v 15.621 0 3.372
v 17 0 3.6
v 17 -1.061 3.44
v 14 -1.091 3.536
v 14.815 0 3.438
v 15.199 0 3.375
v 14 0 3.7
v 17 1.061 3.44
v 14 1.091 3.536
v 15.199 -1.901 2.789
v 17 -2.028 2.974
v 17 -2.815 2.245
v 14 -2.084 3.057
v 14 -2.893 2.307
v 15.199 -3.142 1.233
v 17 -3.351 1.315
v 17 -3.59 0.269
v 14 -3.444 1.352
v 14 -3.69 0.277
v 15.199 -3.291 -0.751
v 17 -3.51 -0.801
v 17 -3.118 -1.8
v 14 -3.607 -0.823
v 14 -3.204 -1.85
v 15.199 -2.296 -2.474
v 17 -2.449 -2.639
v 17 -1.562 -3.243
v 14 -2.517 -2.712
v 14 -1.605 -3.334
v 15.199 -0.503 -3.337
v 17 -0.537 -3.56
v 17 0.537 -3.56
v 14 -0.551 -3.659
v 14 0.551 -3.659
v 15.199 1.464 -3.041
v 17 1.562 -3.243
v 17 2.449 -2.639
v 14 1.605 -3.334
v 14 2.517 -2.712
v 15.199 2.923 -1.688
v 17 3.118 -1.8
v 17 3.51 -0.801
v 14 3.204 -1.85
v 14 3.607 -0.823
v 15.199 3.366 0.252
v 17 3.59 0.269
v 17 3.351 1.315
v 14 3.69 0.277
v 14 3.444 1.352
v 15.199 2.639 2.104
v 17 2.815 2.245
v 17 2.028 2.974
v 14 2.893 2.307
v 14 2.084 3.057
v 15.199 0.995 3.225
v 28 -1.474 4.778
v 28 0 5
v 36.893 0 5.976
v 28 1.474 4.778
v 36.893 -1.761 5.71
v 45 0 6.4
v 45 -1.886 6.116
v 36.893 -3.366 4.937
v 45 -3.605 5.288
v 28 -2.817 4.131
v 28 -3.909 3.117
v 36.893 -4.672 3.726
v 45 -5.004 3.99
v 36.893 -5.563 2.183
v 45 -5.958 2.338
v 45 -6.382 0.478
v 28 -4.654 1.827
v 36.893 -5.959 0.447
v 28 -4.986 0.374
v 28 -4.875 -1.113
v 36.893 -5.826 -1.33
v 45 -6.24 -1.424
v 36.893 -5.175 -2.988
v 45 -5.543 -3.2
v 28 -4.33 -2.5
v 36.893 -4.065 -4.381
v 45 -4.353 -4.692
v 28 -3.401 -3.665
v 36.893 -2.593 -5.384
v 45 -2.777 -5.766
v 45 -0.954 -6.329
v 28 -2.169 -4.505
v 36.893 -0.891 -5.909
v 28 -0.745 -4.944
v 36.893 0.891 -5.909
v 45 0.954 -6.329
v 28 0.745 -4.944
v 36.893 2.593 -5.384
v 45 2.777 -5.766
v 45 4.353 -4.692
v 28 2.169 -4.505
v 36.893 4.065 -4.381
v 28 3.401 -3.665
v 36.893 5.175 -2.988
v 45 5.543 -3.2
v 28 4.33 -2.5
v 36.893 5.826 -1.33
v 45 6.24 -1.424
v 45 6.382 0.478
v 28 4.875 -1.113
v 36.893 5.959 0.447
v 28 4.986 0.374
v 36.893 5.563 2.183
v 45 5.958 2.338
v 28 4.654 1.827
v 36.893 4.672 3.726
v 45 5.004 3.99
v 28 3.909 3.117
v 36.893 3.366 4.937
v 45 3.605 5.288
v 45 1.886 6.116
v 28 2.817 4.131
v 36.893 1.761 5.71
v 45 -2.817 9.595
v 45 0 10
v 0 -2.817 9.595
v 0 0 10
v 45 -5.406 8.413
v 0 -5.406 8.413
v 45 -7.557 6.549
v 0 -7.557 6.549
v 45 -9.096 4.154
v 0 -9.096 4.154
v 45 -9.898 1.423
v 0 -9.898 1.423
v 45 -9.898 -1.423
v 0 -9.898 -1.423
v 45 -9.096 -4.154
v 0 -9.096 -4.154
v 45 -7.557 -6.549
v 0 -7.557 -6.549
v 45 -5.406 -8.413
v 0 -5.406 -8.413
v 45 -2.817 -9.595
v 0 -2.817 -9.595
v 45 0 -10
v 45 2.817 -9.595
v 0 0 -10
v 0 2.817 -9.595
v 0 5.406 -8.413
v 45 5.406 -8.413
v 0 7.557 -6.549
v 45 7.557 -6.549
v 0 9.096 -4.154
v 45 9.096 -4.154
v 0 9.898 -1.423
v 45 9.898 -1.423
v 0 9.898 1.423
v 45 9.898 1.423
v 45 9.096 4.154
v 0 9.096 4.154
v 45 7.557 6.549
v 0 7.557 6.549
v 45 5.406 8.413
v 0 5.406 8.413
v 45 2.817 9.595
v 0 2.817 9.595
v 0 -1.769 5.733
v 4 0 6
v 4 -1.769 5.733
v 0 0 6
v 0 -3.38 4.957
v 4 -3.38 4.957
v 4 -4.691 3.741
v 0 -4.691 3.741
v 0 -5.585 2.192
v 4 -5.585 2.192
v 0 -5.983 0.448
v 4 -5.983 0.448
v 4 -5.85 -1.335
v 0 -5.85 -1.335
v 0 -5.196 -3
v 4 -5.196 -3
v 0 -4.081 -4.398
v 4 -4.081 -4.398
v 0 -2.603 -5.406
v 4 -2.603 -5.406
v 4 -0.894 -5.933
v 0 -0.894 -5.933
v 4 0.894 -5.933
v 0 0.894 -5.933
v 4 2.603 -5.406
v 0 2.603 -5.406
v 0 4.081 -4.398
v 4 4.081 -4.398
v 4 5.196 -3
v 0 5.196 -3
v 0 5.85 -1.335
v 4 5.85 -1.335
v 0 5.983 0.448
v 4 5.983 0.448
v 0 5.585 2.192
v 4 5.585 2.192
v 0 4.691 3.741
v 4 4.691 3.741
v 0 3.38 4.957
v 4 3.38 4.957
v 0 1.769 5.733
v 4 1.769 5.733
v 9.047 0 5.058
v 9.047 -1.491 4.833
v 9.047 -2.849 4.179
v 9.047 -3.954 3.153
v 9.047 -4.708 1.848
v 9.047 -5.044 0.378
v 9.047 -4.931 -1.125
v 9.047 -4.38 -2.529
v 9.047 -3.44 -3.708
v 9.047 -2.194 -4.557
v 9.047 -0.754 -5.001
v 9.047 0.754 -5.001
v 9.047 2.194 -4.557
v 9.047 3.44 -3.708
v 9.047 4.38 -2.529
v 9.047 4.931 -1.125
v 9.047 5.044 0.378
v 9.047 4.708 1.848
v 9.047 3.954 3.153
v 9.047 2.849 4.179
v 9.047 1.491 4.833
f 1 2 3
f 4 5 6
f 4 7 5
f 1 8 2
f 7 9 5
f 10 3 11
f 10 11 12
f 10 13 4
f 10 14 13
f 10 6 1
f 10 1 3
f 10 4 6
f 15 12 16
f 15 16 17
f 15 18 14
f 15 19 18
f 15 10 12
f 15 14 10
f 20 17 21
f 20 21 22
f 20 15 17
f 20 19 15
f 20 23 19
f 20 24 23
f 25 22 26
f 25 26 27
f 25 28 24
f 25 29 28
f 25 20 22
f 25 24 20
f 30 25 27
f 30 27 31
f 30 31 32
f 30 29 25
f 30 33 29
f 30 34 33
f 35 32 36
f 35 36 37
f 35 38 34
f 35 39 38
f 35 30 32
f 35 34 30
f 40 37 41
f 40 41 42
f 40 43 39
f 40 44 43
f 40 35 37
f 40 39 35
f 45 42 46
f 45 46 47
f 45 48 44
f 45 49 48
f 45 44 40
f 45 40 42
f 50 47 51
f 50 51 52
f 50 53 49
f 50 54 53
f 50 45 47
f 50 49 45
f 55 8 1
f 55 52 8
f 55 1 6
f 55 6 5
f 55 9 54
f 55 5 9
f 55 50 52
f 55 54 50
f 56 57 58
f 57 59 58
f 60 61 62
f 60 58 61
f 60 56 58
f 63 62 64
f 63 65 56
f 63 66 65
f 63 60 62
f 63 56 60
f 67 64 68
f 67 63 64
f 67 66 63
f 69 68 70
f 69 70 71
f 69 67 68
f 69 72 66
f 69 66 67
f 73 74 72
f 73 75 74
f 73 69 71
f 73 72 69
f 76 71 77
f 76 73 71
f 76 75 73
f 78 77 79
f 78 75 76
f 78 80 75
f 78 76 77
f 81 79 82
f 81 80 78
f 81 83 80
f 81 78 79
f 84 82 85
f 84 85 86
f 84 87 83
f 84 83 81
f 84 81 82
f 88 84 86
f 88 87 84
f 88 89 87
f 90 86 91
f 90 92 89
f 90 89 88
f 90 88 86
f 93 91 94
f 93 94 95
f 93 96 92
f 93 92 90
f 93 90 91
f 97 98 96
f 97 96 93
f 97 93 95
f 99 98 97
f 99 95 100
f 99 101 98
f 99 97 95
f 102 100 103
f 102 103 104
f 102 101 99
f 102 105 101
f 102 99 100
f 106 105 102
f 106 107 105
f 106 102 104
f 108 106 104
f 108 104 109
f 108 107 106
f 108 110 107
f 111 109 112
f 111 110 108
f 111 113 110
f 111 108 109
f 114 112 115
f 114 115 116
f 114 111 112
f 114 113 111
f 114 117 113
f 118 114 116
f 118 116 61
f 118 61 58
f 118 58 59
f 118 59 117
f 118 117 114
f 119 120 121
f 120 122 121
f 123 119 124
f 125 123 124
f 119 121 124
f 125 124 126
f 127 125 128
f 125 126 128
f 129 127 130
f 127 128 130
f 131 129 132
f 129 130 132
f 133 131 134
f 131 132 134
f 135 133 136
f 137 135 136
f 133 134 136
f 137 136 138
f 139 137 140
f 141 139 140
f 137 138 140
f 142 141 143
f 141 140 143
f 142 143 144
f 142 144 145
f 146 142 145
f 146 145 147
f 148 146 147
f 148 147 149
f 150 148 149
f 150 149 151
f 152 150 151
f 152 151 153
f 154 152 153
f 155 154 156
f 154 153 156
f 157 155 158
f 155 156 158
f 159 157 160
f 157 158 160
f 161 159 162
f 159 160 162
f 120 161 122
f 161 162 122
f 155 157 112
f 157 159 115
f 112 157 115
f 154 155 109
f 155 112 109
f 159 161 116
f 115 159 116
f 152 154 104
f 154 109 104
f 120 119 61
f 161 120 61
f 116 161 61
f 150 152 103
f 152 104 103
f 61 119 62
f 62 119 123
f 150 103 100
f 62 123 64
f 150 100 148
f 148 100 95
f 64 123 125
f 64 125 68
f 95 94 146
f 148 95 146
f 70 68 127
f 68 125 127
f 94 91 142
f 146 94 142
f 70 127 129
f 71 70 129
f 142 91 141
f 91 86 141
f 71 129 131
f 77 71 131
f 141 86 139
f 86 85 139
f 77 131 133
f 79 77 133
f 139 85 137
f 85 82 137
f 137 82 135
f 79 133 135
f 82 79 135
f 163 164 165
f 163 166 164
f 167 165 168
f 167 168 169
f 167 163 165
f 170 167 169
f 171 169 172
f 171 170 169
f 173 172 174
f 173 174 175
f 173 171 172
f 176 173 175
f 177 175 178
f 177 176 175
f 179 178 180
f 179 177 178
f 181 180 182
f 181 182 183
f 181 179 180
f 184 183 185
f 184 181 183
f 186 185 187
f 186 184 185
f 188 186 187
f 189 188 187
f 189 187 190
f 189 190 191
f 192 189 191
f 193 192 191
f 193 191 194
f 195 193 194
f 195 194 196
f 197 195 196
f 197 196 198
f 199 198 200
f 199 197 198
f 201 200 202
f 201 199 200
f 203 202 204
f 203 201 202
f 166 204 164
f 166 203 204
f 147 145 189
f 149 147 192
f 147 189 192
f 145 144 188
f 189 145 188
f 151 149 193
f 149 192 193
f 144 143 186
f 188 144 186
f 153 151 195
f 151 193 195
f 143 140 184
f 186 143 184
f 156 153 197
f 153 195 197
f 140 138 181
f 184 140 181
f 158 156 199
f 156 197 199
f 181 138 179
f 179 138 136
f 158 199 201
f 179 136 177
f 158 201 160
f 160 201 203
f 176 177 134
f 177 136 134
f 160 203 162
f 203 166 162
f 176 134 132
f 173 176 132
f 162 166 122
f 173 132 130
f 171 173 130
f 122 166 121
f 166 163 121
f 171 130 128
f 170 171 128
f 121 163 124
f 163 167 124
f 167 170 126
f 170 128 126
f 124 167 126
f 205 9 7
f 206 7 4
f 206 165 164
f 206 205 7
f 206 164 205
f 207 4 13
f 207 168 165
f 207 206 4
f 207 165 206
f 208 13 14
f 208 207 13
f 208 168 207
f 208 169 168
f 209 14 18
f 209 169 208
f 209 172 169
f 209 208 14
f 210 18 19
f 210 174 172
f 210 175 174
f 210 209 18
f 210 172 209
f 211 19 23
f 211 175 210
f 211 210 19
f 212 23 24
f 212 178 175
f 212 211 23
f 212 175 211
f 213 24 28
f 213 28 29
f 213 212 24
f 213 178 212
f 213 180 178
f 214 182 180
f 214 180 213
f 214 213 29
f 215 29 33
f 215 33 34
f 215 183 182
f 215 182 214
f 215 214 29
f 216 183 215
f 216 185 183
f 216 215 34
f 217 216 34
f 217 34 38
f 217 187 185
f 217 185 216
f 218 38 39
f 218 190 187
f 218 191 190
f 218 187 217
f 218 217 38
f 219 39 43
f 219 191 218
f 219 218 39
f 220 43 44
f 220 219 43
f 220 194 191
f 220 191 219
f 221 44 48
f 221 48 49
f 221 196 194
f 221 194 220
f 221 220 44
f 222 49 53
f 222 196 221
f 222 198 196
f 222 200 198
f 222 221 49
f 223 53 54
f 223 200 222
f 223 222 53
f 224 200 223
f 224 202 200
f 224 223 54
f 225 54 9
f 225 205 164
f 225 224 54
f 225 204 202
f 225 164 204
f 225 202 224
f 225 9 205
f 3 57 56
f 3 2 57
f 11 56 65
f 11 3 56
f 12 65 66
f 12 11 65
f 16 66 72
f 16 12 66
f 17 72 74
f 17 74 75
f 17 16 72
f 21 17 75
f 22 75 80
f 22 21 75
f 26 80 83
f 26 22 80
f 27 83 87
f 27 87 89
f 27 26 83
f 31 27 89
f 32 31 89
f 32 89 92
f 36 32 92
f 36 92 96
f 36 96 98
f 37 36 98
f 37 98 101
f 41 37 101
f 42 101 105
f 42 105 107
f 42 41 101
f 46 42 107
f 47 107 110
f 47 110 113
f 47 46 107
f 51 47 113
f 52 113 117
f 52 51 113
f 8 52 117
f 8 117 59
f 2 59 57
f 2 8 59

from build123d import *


with BuildPart() as part:
    # Çizim1 → Döndür1 (revolve)
    with BuildSketch(Plane.XY, mode=Mode.PRIVATE) as d_nd_r1_sk:
        with BuildLine():
            Line((0, 10), (0, 6))
            add(Edge.make_bspline(
                [(3.999999999, 6), (3.573203683, 6.029894864), (3.001451472, 6.023242918), (2.750658449, 6.020325113), (2.500772177, 6.013075172), (2.250405052, 6.00581128), (2, 6), (0.998511657, 5.97675794), (0, 6)],
                knots=[0, 0, 0, 0.25, 0.25, 0.375, 0.375, 0.5, 0.5, 1, 1, 1], degree=2))
            add(Edge.make_bspline(
                [(13.999999999, 3.7), (13.725109771, 3.789570446), (13.379985223, 3.876191987), (13.16257695, 3.93075849), (12.755078747, 4.022430649), (12.326725472, 4.118794435), (12.130931018, 4.167056311), (11.840601575, 4.238620358), (11.512406828, 4.334776454), (11.272889149, 4.40495151), (10.898359161, 4.522500188), (10.390433228, 4.681916051), (10.284863999, 4.714295864), (9.678129877, 4.900391164), (9.046858498, 5.057724167), (8.483431364, 5.198148217), (7.795190546, 5.343818741), (7.267903779, 5.455422321), (6.536709902, 5.596919792), (5.622059189, 5.773919036), (5.272499855, 5.834788977), (4.541593183, 5.962064212), (3.999999999, 6)],
                knots=[0, 0, 0, 0.0625, 0.0625, 0.125, 0.125, 0.1875, 0.1875, 0.25, 0.25, 0.3125, 0.3125, 0.375, 0.375, 0.5, 0.5, 0.625, 0.625, 0.75, 0.75, 0.875, 0.875, 1, 1, 1], degree=2))
            add(Edge.make_bspline(
                [(17.000000001, 3.6), (16.94912206, 3.590048056), (16.616896338, 3.522409625), (16.383250062, 3.474841161), (16.233592954, 3.448430181), (15.793839444, 3.370823968), (15.472717608, 3.36628616), (15.275373224, 3.363497465), (15.098310939, 3.385612624), (14.925217424, 3.407232082), (14.72968193, 3.460619582), (14.583988305, 3.500398644), (14.364825373, 3.575467167), (14.02568746, 3.691629978), (13.999999999, 3.7)],
                knots=[0, 0, 0, 0.125, 0.125, 0.25, 0.25, 0.5, 0.5, 0.625, 0.625, 0.75, 0.75, 0.875, 0.875, 1, 1, 1], degree=2))
            add(Edge.make_bspline(
                [(28, 5), (27.453374371, 4.930752702), (26.625302067, 4.828114198), (25.323567376, 4.666765846), (25.250029749, 4.657604863), (24.324917168, 4.542358553), (23.873659832, 4.483792961), (23.185036587, 4.394421277), (22.496371529, 4.305372362), (20.836975445, 4.09080155), (19.748698159, 3.972411465), (19.126893942, 3.904767442), (19.06435576, 3.897798962), (18.674284635, 3.854334269), (18.379264226, 3.816881085), (17.608594002, 3.719043604), (17.000000001, 3.6)],
                knots=[0, 0, 0, 0.125, 0.125, 0.25, 0.25, 0.375, 0.375, 0.5, 0.5, 0.75, 0.75, 0.8125, 0.8125, 0.875, 0.875, 1, 1, 1], degree=2))
            add(Edge.make_bspline(
                [(45, 6.4), (42.866261495, 6.358494477), (40.736247962, 6.242371115), (38.762055309, 6.134742742), (36.480319512, 5.941329752), (34.157148009, 5.744404434), (32.233944641, 5.526718354), (31.166866956, 5.405936557), (30.115887491, 5.270427977), (29.05809369, 5.134040787), (28, 5)],
                knots=[0, 0, 0, 0.25, 0.25, 0.5, 0.5, 0.75, 0.75, 0.875, 0.875, 1, 1, 1], degree=2))
            Line((45, 6.4), (45, 10))
            Line((45, 10), (0, 10))
        make_face()
    revolve(d_nd_r1_sk.sketch.rotate(Axis((0, 0, 0), (1, 0, 0)), 90), axis=Axis((0, 0, 0), (1, 0, 0)))


solid = part.part
